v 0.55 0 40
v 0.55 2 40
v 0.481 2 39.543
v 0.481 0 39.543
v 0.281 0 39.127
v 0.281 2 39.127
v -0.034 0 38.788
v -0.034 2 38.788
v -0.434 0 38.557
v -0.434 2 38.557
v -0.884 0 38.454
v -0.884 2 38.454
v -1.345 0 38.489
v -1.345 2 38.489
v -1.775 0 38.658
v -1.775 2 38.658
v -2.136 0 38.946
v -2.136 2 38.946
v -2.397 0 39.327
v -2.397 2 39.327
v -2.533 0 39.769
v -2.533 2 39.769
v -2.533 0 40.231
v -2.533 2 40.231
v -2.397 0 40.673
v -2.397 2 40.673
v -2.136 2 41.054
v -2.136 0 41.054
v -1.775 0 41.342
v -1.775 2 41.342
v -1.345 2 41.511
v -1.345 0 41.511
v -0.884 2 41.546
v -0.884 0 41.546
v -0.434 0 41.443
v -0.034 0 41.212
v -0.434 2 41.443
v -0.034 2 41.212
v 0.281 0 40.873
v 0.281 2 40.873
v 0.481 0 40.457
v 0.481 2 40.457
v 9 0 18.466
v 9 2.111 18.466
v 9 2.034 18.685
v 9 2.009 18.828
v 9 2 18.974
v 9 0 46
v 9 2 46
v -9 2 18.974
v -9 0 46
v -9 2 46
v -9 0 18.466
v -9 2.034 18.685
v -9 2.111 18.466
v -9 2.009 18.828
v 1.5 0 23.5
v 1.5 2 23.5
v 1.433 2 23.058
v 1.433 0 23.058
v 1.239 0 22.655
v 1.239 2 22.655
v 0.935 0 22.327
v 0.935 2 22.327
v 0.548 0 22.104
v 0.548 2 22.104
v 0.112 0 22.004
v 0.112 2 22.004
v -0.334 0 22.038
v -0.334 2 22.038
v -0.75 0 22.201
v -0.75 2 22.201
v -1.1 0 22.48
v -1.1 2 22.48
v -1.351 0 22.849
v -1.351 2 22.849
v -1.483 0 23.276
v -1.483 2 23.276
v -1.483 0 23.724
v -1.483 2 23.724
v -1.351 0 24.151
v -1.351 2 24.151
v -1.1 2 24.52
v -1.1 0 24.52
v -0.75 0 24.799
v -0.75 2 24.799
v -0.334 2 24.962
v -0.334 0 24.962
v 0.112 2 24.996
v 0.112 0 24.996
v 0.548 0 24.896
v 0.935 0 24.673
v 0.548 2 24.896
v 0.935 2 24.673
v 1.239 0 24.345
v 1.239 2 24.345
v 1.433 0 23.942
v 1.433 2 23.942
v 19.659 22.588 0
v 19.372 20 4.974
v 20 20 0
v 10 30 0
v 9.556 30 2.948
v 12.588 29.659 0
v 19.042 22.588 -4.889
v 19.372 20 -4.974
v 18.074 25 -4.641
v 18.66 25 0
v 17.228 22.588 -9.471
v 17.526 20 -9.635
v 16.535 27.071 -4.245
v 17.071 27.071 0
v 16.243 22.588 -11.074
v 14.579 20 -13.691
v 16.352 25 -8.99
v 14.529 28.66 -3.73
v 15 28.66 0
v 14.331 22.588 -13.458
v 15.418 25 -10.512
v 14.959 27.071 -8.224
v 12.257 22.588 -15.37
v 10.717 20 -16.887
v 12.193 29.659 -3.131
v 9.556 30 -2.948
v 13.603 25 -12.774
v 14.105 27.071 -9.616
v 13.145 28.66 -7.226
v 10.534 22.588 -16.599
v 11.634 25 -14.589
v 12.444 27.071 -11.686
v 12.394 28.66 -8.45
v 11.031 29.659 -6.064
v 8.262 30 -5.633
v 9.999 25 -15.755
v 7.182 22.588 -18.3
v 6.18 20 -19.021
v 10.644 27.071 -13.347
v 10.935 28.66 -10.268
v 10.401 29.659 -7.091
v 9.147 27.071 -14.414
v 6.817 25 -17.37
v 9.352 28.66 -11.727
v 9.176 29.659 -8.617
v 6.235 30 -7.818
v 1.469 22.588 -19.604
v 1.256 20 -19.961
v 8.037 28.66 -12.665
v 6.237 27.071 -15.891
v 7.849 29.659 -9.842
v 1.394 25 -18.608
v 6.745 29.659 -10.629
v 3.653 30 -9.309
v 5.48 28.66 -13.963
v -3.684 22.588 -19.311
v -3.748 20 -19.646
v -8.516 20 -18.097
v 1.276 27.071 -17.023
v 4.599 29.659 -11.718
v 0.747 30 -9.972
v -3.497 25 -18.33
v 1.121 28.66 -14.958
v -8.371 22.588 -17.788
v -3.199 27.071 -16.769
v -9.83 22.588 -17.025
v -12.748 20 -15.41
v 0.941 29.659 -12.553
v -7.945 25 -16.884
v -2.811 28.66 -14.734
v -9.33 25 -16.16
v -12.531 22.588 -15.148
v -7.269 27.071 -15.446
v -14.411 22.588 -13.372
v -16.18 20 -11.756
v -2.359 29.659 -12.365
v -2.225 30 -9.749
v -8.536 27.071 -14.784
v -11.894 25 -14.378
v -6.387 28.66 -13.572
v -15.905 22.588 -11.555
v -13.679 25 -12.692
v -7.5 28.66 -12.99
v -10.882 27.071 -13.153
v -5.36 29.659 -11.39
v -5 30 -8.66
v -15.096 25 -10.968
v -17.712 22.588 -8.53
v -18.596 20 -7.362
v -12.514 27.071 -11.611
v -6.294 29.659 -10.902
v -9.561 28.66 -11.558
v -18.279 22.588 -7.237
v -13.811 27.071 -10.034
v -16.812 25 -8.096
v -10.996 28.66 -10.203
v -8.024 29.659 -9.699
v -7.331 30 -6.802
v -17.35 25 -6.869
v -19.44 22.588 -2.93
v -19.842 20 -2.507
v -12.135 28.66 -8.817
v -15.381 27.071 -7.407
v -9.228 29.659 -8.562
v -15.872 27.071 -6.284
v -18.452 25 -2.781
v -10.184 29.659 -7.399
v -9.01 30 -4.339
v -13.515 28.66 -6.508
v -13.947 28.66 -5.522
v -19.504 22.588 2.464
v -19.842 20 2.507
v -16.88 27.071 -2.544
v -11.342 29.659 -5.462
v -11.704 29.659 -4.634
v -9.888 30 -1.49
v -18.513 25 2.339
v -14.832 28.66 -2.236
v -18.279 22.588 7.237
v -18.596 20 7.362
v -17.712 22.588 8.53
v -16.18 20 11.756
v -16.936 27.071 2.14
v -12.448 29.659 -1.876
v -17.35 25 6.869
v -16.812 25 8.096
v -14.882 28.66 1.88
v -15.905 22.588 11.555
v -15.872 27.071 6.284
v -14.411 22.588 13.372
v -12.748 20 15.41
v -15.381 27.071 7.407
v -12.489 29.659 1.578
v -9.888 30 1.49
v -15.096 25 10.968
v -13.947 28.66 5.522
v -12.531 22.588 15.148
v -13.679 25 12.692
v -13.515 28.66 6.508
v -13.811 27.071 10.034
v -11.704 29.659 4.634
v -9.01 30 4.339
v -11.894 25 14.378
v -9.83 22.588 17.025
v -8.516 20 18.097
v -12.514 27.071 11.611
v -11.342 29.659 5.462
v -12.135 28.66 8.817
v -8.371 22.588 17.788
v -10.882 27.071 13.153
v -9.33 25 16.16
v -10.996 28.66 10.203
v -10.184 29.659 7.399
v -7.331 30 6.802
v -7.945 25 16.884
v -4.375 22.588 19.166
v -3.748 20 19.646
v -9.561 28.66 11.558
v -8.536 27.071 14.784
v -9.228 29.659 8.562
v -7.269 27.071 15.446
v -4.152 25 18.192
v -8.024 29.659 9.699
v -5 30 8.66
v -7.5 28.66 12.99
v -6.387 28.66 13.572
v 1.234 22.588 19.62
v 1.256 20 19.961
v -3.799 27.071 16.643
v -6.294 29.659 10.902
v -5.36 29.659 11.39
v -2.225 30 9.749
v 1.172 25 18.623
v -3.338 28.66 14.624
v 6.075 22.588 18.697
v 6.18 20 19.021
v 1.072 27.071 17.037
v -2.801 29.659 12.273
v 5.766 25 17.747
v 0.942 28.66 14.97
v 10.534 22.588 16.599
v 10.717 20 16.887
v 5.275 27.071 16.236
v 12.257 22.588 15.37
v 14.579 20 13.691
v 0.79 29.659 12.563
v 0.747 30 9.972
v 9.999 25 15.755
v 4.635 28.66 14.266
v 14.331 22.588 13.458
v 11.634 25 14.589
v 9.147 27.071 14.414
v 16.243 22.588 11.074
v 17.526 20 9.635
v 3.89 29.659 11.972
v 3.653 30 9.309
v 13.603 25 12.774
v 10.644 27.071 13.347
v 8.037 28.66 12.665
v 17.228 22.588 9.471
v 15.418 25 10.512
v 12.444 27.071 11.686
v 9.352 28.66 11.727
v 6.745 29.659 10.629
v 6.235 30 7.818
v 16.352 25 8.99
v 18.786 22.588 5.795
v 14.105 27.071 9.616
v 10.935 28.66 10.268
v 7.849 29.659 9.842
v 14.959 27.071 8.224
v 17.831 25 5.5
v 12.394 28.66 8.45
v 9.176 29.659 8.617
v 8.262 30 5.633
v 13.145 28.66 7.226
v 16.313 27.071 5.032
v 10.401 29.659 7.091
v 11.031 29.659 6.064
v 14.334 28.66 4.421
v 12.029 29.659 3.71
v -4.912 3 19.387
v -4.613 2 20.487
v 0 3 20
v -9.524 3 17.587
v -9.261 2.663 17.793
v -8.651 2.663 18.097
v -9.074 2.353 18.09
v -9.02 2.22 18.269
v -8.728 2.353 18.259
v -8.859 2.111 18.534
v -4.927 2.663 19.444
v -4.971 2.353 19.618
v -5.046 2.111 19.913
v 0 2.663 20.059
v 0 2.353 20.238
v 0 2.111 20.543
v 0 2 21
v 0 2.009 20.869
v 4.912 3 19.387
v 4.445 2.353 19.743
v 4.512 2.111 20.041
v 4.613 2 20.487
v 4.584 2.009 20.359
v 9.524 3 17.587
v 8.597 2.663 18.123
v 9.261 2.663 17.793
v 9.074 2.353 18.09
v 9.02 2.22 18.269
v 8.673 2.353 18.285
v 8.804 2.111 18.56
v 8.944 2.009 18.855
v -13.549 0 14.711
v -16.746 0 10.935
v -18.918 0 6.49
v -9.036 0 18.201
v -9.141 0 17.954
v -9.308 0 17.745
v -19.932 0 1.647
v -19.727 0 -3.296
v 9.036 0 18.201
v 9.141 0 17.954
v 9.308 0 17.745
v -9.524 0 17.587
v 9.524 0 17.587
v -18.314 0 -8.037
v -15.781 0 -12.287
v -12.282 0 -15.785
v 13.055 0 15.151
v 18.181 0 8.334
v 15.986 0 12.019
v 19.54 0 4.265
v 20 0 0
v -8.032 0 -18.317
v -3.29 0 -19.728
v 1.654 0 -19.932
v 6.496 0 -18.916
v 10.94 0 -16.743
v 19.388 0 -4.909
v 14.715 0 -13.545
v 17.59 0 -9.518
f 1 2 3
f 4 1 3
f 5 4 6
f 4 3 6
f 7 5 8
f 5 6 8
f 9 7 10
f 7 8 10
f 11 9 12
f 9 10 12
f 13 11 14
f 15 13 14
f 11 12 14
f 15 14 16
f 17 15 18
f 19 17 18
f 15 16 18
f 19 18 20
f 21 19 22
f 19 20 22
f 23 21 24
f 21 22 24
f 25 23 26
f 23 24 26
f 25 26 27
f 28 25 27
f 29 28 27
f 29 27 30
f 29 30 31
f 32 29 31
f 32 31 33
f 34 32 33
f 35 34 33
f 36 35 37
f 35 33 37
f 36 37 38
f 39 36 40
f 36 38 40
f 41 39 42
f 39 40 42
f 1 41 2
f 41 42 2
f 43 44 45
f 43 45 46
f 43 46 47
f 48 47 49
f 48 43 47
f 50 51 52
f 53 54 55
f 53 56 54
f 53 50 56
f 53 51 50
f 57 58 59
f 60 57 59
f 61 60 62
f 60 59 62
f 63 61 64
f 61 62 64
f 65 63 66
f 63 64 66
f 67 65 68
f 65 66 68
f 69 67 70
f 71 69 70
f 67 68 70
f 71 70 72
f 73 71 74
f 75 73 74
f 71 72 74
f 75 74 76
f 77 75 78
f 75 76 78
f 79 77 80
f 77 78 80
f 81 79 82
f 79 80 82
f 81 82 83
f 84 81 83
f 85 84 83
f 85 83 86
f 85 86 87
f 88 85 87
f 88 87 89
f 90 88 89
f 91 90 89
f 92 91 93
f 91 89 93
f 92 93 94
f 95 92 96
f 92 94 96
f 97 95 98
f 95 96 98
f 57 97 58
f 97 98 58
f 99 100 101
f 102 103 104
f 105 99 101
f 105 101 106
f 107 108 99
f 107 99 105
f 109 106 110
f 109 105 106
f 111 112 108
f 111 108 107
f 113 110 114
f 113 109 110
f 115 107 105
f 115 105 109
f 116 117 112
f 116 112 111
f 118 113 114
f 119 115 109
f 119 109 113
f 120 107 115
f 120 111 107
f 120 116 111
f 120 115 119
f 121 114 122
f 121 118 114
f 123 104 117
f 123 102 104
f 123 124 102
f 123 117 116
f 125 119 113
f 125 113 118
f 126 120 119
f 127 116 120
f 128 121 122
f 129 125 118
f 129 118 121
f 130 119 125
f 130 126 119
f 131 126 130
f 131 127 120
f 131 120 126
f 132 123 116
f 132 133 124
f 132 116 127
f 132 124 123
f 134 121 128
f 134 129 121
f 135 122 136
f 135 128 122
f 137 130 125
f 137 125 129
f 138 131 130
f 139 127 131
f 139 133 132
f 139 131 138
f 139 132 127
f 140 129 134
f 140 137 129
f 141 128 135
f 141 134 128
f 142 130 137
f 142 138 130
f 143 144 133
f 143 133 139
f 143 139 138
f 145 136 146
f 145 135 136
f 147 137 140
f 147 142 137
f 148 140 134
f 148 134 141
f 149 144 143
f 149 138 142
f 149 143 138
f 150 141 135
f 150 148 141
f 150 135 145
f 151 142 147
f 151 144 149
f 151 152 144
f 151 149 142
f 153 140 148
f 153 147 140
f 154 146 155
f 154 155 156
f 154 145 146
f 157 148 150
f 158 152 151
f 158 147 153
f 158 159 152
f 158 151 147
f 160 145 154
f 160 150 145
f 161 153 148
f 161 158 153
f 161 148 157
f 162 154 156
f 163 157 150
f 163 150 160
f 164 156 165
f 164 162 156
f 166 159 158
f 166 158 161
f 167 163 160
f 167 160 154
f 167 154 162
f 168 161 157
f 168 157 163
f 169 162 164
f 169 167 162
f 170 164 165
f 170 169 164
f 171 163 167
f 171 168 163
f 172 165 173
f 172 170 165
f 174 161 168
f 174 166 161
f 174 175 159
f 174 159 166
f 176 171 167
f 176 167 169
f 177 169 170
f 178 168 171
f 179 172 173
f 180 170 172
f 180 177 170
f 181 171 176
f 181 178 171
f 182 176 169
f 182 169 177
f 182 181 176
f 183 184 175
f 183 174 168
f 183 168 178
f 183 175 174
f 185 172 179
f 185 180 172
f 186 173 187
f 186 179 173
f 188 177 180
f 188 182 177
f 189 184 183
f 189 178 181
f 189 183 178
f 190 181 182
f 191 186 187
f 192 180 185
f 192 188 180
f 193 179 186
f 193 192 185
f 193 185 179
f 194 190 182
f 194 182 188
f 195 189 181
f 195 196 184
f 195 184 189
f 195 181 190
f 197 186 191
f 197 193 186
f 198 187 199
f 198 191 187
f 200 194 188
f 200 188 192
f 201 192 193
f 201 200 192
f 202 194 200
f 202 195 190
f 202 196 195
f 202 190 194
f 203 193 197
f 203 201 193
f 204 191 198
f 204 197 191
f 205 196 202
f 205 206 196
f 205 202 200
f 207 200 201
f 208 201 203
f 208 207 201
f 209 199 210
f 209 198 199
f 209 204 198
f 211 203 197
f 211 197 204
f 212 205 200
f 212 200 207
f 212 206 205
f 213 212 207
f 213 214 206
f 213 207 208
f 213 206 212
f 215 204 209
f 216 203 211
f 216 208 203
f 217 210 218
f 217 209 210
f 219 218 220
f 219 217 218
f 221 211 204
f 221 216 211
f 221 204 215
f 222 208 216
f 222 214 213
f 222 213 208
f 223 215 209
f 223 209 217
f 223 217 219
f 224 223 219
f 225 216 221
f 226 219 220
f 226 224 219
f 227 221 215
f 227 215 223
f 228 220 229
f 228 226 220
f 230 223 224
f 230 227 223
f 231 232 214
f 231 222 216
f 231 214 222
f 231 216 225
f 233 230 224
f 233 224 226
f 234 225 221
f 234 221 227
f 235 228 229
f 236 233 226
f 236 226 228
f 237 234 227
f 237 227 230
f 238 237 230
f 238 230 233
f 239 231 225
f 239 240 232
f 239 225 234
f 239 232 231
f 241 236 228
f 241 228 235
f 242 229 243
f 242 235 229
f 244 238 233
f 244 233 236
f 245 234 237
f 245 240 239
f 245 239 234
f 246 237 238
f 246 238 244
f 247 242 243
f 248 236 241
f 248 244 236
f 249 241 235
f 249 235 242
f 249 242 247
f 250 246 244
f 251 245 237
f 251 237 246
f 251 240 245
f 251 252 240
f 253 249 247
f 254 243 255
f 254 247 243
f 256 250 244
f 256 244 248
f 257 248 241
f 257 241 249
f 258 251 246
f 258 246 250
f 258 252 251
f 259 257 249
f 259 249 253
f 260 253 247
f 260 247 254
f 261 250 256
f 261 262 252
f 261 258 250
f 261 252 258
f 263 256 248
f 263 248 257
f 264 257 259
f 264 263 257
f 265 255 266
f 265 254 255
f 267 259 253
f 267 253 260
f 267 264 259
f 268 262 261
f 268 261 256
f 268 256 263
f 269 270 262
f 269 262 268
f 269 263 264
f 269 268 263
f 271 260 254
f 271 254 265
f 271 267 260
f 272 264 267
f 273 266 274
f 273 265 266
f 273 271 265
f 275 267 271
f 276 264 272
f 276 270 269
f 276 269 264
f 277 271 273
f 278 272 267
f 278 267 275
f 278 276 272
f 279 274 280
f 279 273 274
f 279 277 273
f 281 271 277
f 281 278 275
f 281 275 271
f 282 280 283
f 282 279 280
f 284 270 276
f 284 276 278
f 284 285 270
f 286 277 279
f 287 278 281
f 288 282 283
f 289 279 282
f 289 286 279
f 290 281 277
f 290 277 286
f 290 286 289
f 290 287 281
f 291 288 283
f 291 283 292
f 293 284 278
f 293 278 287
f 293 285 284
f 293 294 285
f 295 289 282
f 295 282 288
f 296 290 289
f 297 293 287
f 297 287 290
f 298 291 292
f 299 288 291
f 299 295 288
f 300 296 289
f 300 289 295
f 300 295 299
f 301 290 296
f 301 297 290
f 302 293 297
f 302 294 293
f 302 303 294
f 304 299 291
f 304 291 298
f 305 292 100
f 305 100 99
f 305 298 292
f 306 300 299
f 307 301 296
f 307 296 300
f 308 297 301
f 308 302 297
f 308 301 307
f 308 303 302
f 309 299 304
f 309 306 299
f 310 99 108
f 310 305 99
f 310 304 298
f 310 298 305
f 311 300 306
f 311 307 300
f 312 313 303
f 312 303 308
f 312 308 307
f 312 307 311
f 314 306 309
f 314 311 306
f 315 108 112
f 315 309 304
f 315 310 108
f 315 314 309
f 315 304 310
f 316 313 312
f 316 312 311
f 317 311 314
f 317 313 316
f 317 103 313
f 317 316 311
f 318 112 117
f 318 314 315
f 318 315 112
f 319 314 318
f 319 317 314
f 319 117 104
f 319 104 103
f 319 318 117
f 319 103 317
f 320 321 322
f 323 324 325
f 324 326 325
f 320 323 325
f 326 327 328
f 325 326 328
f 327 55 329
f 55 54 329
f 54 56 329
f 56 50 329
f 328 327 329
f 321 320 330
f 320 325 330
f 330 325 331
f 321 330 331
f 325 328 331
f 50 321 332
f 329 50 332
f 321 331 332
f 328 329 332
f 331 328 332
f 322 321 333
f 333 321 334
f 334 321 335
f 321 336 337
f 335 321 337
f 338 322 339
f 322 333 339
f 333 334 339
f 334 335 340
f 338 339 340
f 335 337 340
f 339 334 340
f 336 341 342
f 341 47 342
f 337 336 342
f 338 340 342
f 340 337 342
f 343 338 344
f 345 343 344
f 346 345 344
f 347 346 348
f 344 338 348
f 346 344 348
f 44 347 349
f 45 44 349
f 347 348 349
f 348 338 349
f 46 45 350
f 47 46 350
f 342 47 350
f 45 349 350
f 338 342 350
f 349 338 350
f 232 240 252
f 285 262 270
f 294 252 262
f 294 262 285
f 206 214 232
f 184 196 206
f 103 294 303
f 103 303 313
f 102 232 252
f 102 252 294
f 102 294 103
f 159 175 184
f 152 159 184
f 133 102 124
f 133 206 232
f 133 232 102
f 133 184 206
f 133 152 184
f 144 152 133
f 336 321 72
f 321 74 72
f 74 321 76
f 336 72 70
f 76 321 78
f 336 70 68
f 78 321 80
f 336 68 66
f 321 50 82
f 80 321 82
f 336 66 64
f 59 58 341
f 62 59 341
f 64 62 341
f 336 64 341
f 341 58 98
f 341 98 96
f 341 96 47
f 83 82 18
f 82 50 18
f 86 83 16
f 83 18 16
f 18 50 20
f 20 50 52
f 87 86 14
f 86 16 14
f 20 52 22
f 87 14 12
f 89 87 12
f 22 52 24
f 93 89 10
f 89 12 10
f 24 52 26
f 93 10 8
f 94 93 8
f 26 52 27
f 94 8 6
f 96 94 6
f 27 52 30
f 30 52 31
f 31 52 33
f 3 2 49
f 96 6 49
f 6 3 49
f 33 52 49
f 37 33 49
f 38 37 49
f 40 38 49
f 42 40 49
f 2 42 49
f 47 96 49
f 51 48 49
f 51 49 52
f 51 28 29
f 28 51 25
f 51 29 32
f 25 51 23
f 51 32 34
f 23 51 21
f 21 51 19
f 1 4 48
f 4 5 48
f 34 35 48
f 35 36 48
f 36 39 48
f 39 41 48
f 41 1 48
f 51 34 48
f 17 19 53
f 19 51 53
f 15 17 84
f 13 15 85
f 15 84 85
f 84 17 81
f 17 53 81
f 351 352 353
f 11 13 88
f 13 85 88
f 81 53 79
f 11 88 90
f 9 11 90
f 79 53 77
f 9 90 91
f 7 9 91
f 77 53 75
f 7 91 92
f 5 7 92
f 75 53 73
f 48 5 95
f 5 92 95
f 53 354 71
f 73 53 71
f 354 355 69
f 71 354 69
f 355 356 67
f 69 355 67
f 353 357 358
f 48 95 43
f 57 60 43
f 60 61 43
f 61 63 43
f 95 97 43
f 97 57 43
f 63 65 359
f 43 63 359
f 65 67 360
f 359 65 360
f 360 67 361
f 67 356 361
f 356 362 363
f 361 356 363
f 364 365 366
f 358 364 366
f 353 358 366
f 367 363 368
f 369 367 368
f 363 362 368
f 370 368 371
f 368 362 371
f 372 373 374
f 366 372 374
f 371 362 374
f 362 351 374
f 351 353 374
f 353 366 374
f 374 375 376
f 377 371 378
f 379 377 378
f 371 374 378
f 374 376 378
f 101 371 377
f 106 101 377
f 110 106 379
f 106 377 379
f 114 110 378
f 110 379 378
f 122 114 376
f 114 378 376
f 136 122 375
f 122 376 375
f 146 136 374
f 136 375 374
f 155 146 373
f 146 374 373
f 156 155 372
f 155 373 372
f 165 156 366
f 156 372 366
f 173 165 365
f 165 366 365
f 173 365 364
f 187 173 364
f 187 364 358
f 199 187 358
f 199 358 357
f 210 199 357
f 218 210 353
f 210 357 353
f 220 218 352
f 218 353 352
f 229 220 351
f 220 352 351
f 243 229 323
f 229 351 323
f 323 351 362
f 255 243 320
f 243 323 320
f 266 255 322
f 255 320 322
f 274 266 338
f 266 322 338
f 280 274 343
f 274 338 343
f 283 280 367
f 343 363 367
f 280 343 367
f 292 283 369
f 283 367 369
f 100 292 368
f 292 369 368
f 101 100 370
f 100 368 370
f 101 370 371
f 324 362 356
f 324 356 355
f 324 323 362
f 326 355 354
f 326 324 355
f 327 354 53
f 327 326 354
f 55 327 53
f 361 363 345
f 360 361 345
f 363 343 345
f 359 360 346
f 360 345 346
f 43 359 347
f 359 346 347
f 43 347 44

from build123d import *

# Parameters (mm, degrees)
SKETCH1_R           = 20
BOSS_EXTRUDE1_DEPTH = 30
BOSS_EXTRUDE2_DEPTH = 2
SKETCH3_R           = 1.55
SKETCH3_R_2         = 1.5
CUT_EXTRUDE1_DEPTH  = 2
FILLET1_R           = 1
FILLET2_R           = 10


with BuildPart() as part:
    # Sketch1 → Boss-Extrude1 (new body)
    with BuildSketch(Plane(origin=(0, 0, 0), x_dir=(1, 0, 0), z_dir=(0, 1, 0))):
        Circle(SKETCH1_R)
    extrude(amount=BOSS_EXTRUDE1_DEPTH)

    # Sketch2 → Boss-Extrude2 (add)
    with BuildSketch(Plane.XZ):
        with BuildLine():
            Line((-9, 46), (-9, 17.860571099))
            ThreePointArc((-9, 17.860571099), (0, 20), (9, 17.860571099))
            Line((9, 17.860571099), (9, 46))
            Line((9, 46), (-9, 46))
        make_face()
    extrude(amount=-BOSS_EXTRUDE2_DEPTH)

    # Sketch3 → Cut-Extrude1 (cut)
    with BuildSketch(Plane(origin=(0, 2, 0), x_dir=(1, 0, 0), z_dir=(0, 1, 0))):
        with Locations((-1, -40)):
            Circle(SKETCH3_R)
        with Locations((0, -23.5)):
            Circle(SKETCH3_R_2)
    extrude(amount=-CUT_EXTRUDE1_DEPTH, mode=Mode.SUBTRACT)

    # Fillet1
    fillet1_edges = [part.edges().sort_by_distance(p)[0] for p in [
        (-9, 1, 17.860571099),
        (0, 2, 20),
        (9, 1, 17.860571099),
    ]]
    fillet(fillet1_edges, radius=FILLET1_R)

    # Fillet2
    fillet2_edges = [part.edges().sort_by_distance(p)[0] for p in [
        (-20, 30, 0),
    ]]
    fillet(fillet2_edges, radius=FILLET2_R)


solid = part.part
